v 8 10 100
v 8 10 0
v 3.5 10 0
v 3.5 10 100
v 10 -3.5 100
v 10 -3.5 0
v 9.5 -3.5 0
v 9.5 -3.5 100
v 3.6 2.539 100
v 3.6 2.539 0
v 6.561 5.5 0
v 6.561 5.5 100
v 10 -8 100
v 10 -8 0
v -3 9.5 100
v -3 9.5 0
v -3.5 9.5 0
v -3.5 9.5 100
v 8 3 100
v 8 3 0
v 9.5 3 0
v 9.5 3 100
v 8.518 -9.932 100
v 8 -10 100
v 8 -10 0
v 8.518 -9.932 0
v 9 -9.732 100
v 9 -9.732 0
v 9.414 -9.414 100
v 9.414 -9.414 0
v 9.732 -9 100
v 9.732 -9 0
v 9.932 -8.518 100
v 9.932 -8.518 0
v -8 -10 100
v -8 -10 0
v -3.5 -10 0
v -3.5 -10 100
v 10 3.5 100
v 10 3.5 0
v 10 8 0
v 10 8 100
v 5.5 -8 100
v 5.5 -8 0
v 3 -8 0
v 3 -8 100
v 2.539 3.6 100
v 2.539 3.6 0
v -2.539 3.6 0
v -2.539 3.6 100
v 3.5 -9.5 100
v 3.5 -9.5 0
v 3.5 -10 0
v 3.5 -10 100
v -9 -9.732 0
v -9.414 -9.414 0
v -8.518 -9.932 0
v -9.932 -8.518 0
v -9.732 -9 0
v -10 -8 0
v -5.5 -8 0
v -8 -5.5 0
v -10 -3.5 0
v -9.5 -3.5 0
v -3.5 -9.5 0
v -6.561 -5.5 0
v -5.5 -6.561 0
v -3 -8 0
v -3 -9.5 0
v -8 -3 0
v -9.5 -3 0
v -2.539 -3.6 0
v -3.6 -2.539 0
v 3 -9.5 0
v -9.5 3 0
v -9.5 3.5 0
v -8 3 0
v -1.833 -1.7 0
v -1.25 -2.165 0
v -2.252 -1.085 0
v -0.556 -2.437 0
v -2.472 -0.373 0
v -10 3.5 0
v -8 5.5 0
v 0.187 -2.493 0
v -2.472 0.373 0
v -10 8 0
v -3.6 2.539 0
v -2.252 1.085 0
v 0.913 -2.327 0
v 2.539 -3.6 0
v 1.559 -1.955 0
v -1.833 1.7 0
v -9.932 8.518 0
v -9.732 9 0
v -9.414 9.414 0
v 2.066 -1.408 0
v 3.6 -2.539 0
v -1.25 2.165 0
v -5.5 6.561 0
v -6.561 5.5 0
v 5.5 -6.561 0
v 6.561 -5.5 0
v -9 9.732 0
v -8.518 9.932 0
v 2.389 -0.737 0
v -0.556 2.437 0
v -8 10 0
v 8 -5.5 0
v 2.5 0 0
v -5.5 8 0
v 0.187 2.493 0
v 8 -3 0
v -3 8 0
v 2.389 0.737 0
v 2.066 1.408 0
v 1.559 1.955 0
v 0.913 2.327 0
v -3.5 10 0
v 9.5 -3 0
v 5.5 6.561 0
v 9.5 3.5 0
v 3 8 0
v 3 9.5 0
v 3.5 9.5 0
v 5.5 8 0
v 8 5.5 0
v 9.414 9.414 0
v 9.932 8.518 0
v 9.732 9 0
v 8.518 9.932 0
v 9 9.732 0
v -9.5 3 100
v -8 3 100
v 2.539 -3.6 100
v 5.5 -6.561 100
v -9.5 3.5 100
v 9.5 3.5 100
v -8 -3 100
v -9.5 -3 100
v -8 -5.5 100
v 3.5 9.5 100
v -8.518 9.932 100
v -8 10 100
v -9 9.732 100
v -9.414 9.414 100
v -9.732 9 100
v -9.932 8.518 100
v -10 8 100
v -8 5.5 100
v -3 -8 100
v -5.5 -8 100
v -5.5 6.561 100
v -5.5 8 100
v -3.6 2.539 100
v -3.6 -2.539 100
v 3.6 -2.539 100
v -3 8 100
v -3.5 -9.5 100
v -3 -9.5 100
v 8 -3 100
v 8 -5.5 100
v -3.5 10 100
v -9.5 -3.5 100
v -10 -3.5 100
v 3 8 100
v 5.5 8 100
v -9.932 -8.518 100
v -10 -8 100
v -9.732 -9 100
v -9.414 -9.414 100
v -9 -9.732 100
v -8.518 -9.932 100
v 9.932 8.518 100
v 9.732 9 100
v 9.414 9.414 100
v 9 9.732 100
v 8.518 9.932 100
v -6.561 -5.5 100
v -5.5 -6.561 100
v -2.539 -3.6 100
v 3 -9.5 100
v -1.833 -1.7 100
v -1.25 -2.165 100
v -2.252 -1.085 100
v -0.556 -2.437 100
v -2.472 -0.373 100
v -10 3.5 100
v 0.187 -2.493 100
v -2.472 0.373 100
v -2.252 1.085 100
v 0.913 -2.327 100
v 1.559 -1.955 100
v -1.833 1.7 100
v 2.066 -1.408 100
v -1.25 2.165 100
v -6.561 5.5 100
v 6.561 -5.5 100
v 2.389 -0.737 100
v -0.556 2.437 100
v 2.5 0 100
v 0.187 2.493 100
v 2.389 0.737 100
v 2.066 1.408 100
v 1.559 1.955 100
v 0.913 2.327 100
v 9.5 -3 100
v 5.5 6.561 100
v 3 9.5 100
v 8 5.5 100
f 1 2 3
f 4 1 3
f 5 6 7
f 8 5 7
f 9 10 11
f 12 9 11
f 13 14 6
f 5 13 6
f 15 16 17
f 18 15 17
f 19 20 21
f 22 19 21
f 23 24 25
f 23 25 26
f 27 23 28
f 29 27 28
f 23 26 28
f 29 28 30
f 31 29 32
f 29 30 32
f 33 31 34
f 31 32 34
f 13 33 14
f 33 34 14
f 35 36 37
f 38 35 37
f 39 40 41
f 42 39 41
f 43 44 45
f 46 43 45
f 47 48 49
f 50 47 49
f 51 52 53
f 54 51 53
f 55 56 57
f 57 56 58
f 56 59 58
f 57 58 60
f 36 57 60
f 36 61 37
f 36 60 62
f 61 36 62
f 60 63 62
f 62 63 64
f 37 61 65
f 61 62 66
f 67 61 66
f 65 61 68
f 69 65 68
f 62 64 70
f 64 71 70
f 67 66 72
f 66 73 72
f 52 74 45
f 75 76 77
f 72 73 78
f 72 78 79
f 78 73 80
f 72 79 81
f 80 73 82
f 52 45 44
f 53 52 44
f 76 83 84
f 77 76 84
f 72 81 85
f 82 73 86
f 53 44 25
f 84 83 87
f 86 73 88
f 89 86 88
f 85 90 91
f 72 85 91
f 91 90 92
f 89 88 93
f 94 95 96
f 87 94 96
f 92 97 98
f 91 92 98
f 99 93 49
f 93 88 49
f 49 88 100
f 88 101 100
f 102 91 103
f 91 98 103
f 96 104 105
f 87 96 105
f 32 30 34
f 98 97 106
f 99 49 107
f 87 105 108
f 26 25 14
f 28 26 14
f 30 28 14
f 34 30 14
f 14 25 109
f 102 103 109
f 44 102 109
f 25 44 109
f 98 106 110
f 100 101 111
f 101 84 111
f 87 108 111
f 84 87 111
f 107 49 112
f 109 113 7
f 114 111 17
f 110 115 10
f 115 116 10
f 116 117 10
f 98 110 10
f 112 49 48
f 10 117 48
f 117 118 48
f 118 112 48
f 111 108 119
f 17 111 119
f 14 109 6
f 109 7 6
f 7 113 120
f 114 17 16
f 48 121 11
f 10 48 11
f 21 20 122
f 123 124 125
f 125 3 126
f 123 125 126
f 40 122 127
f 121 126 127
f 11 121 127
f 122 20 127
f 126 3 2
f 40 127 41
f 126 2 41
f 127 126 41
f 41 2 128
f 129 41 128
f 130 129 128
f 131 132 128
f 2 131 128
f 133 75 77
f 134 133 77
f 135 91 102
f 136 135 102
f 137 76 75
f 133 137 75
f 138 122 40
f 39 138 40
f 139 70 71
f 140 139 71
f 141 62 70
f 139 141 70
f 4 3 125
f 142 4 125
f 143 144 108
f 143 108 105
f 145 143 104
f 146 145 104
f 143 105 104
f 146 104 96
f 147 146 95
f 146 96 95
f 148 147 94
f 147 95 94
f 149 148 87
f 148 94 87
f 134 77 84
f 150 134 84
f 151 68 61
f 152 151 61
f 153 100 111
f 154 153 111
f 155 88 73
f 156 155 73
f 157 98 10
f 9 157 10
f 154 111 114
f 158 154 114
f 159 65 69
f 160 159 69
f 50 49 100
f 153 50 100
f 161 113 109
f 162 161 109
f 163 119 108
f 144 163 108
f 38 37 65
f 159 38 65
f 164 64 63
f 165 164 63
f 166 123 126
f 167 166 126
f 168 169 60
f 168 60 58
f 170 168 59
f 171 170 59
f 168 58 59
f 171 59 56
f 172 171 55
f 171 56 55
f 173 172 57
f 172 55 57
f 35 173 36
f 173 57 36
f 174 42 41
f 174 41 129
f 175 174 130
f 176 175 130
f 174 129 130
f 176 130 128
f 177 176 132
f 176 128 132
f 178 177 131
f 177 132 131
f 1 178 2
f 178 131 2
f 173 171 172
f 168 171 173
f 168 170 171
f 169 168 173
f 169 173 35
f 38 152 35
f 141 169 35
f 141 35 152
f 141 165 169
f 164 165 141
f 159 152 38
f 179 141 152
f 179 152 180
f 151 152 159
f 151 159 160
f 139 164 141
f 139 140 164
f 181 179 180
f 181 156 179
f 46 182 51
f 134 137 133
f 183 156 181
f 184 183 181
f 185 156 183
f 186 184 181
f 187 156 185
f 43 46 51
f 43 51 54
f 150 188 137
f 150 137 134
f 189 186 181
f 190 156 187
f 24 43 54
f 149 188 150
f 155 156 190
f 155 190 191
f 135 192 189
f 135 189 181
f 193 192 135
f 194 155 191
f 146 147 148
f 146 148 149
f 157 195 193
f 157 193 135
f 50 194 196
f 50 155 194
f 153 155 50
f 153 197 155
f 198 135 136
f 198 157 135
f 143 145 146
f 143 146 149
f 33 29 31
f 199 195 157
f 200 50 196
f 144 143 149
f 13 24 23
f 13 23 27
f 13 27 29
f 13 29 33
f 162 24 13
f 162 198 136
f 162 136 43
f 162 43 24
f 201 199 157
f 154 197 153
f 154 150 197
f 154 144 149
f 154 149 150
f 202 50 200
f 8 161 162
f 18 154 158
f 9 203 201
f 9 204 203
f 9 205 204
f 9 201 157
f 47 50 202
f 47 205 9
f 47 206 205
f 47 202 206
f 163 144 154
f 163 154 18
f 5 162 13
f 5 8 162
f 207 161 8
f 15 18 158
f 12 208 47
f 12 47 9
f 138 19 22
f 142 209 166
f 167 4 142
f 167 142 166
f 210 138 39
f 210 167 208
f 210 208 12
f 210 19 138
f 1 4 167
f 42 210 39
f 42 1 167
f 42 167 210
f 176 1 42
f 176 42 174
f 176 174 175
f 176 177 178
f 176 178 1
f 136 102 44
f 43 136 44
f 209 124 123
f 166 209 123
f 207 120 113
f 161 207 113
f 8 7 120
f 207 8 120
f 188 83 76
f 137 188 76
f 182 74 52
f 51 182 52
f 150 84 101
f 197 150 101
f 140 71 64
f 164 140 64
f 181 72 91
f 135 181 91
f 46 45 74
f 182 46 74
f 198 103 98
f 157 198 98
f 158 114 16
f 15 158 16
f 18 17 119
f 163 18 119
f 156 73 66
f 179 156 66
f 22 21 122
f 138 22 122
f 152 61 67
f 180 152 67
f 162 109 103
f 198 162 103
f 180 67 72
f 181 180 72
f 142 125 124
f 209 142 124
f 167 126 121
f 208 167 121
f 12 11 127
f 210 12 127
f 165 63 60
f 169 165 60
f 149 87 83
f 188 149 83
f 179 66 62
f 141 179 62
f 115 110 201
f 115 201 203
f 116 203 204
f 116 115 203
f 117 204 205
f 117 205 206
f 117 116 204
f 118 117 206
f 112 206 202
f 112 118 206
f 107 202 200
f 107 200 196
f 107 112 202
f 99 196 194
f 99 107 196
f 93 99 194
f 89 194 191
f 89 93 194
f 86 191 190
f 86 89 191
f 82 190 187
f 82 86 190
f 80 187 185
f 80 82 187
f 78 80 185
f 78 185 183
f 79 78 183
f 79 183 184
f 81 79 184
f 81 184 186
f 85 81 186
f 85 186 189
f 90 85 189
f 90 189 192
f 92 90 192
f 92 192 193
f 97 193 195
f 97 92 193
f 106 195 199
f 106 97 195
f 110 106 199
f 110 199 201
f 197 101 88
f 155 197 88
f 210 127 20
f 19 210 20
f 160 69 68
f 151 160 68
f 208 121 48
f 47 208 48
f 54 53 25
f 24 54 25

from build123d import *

# Parameters (mm, degrees)
SKETCH1_R           = 2.5
BOSS_EXTRUDE1_DEPTH = 100


with BuildPart() as part:
    # Sketch1 → Boss-Extrude1 (new body)
    with BuildSketch(Plane.XY):
        with BuildLine():
            Line((8, -3), (8, -5.5))
            Line((8, -5.5), (6.560660172, -5.5))
            Line((6.560660172, -5.5), (3.6, -2.539339828))
            Line((3.6, -2.539339828), (3.6, 2.539339828))
            Line((3.6, 2.539339828), (6.560660172, 5.5))
            Line((6.560660172, 5.5), (8, 5.5))
            Line((8, 5.5), (8, 3))
            Line((8, 3), (9.5, 3))
            Line((9.5, 3), (9.5, 3.5))
            Line((9.5, 3.5), (10, 3.5))
            Line((10, 3.5), (10, 8))
            ThreePointArc((10, 8), (9.414213562, 9.414213562), (8, 10))
            Line((8, 10), (3.5, 10))
            Line((3.5, 10), (3.5, 9.5))
            Line((3.5, 9.5), (3, 9.5))
            Line((3, 9.5), (3, 8))
            Line((3, 8), (5.5, 8))
            Line((5.5, 8), (5.5, 6.560660172))
            Line((5.5, 6.560660172), (2.539339828, 3.6))
            Line((2.539339828, 3.6), (-2.539339828, 3.6))
            Line((-2.539339828, 3.6), (-5.5, 6.560660172))
            Line((-5.5, 6.560660172), (-5.5, 8))
            Line((-5.5, 8), (-3, 8))
            Line((-3, 8), (-3, 9.5))
            Line((-3, 9.5), (-3.5, 9.5))
            Line((-3.5, 9.5), (-3.5, 10))
            Line((-3.5, 10), (-8, 10))
            ThreePointArc((-8, 10), (-9.414213562, 9.414213562), (-10, 8))
            Line((-10, 8), (-10, 3.5))
            Line((-10, 3.5), (-9.5, 3.5))
            Line((-9.5, 3.5), (-9.5, 3))
            Line((-9.5, 3), (-8, 3))
            Line((-8, 3), (-8, 5.5))
            Line((-8, 5.5), (-6.560660172, 5.5))
            Line((-6.560660172, 5.5), (-3.6, 2.539339828))
            Line((-3.6, 2.539339828), (-3.6, -2.539339828))
            Line((-3.6, -2.539339828), (-6.560660172, -5.5))
            Line((-6.560660172, -5.5), (-8, -5.5))
            Line((-8, -5.5), (-8, -3))
            Line((-8, -3), (-9.5, -3))
            Line((-9.5, -3), (-9.5, -3.5))
            Line((-9.5, -3.5), (-10, -3.5))
            Line((-10, -3.5), (-10, -8))
            ThreePointArc((-10, -8), (-9.414213562, -9.414213562), (-8, -10))
            Line((-8, -10), (-3.5, -10))
            Line((-3.5, -10), (-3.5, -9.5))
            Line((-3.5, -9.5), (-3, -9.5))
            Line((-3, -9.5), (-3, -8))
            Line((-3, -8), (-5.5, -8))
            Line((-5.5, -8), (-5.5, -6.560660172))
            Line((-5.5, -6.560660172), (-2.539339828, -3.6))
            Line((-2.539339828, -3.6), (2.539339828, -3.6))
            Line((2.539339828, -3.6), (5.5, -6.560660172))
            Line((5.5, -6.560660172), (5.5, -8))
            Line((5.5, -8), (3, -8))
            Line((3, -8), (3, -9.5))
            Line((3, -9.5), (3.5, -9.5))
            Line((3.5, -9.5), (3.5, -10))
            Line((3.5, -10), (8, -10))
            ThreePointArc((8, -10), (9.414213562, -9.414213562), (10, -8))
            Line((10, -8), (10, -3.5))
            Line((10, -3.5), (9.5, -3.5))
            Line((9.5, -3.5), (9.5, -3))
            Line((9.5, -3), (8, -3))
        make_face()
        Circle(SKETCH1_R, mode=Mode.SUBTRACT)
    extrude(amount=BOSS_EXTRUDE1_DEPTH)


solid = part.part
